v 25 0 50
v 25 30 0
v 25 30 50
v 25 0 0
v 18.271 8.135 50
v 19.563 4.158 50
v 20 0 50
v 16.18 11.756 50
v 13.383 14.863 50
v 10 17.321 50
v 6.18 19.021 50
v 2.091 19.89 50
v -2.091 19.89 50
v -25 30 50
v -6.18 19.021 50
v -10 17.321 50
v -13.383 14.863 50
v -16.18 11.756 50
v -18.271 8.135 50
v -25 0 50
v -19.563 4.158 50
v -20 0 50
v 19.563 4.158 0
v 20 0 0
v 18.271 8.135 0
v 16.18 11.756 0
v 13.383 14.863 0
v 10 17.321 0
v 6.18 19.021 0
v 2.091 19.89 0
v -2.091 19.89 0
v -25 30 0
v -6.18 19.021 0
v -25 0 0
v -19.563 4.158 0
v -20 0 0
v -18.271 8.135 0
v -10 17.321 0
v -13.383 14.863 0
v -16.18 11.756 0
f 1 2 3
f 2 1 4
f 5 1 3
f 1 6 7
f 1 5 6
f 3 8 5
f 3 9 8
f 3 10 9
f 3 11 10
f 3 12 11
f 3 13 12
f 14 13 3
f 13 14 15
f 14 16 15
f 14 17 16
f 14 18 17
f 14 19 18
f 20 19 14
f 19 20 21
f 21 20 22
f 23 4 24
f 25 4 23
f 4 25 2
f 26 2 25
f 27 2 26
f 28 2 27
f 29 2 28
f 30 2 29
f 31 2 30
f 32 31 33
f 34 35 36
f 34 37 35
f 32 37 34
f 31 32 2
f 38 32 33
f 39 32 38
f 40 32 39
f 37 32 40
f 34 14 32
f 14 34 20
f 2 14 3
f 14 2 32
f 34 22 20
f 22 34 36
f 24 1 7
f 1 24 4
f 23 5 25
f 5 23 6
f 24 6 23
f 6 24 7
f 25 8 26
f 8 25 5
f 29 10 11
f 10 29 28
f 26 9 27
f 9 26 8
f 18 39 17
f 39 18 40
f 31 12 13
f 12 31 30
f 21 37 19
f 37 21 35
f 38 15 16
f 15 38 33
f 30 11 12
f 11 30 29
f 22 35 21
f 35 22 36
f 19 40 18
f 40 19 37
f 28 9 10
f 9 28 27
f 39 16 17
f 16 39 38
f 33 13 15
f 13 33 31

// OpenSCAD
//3D Shapes- Design Time: Halfpipe

difference(){
    translate([-25,0,0]) cube([50,30,50]);
    translate([0,0,-1]) cylinder(60, 20, 20);
}
